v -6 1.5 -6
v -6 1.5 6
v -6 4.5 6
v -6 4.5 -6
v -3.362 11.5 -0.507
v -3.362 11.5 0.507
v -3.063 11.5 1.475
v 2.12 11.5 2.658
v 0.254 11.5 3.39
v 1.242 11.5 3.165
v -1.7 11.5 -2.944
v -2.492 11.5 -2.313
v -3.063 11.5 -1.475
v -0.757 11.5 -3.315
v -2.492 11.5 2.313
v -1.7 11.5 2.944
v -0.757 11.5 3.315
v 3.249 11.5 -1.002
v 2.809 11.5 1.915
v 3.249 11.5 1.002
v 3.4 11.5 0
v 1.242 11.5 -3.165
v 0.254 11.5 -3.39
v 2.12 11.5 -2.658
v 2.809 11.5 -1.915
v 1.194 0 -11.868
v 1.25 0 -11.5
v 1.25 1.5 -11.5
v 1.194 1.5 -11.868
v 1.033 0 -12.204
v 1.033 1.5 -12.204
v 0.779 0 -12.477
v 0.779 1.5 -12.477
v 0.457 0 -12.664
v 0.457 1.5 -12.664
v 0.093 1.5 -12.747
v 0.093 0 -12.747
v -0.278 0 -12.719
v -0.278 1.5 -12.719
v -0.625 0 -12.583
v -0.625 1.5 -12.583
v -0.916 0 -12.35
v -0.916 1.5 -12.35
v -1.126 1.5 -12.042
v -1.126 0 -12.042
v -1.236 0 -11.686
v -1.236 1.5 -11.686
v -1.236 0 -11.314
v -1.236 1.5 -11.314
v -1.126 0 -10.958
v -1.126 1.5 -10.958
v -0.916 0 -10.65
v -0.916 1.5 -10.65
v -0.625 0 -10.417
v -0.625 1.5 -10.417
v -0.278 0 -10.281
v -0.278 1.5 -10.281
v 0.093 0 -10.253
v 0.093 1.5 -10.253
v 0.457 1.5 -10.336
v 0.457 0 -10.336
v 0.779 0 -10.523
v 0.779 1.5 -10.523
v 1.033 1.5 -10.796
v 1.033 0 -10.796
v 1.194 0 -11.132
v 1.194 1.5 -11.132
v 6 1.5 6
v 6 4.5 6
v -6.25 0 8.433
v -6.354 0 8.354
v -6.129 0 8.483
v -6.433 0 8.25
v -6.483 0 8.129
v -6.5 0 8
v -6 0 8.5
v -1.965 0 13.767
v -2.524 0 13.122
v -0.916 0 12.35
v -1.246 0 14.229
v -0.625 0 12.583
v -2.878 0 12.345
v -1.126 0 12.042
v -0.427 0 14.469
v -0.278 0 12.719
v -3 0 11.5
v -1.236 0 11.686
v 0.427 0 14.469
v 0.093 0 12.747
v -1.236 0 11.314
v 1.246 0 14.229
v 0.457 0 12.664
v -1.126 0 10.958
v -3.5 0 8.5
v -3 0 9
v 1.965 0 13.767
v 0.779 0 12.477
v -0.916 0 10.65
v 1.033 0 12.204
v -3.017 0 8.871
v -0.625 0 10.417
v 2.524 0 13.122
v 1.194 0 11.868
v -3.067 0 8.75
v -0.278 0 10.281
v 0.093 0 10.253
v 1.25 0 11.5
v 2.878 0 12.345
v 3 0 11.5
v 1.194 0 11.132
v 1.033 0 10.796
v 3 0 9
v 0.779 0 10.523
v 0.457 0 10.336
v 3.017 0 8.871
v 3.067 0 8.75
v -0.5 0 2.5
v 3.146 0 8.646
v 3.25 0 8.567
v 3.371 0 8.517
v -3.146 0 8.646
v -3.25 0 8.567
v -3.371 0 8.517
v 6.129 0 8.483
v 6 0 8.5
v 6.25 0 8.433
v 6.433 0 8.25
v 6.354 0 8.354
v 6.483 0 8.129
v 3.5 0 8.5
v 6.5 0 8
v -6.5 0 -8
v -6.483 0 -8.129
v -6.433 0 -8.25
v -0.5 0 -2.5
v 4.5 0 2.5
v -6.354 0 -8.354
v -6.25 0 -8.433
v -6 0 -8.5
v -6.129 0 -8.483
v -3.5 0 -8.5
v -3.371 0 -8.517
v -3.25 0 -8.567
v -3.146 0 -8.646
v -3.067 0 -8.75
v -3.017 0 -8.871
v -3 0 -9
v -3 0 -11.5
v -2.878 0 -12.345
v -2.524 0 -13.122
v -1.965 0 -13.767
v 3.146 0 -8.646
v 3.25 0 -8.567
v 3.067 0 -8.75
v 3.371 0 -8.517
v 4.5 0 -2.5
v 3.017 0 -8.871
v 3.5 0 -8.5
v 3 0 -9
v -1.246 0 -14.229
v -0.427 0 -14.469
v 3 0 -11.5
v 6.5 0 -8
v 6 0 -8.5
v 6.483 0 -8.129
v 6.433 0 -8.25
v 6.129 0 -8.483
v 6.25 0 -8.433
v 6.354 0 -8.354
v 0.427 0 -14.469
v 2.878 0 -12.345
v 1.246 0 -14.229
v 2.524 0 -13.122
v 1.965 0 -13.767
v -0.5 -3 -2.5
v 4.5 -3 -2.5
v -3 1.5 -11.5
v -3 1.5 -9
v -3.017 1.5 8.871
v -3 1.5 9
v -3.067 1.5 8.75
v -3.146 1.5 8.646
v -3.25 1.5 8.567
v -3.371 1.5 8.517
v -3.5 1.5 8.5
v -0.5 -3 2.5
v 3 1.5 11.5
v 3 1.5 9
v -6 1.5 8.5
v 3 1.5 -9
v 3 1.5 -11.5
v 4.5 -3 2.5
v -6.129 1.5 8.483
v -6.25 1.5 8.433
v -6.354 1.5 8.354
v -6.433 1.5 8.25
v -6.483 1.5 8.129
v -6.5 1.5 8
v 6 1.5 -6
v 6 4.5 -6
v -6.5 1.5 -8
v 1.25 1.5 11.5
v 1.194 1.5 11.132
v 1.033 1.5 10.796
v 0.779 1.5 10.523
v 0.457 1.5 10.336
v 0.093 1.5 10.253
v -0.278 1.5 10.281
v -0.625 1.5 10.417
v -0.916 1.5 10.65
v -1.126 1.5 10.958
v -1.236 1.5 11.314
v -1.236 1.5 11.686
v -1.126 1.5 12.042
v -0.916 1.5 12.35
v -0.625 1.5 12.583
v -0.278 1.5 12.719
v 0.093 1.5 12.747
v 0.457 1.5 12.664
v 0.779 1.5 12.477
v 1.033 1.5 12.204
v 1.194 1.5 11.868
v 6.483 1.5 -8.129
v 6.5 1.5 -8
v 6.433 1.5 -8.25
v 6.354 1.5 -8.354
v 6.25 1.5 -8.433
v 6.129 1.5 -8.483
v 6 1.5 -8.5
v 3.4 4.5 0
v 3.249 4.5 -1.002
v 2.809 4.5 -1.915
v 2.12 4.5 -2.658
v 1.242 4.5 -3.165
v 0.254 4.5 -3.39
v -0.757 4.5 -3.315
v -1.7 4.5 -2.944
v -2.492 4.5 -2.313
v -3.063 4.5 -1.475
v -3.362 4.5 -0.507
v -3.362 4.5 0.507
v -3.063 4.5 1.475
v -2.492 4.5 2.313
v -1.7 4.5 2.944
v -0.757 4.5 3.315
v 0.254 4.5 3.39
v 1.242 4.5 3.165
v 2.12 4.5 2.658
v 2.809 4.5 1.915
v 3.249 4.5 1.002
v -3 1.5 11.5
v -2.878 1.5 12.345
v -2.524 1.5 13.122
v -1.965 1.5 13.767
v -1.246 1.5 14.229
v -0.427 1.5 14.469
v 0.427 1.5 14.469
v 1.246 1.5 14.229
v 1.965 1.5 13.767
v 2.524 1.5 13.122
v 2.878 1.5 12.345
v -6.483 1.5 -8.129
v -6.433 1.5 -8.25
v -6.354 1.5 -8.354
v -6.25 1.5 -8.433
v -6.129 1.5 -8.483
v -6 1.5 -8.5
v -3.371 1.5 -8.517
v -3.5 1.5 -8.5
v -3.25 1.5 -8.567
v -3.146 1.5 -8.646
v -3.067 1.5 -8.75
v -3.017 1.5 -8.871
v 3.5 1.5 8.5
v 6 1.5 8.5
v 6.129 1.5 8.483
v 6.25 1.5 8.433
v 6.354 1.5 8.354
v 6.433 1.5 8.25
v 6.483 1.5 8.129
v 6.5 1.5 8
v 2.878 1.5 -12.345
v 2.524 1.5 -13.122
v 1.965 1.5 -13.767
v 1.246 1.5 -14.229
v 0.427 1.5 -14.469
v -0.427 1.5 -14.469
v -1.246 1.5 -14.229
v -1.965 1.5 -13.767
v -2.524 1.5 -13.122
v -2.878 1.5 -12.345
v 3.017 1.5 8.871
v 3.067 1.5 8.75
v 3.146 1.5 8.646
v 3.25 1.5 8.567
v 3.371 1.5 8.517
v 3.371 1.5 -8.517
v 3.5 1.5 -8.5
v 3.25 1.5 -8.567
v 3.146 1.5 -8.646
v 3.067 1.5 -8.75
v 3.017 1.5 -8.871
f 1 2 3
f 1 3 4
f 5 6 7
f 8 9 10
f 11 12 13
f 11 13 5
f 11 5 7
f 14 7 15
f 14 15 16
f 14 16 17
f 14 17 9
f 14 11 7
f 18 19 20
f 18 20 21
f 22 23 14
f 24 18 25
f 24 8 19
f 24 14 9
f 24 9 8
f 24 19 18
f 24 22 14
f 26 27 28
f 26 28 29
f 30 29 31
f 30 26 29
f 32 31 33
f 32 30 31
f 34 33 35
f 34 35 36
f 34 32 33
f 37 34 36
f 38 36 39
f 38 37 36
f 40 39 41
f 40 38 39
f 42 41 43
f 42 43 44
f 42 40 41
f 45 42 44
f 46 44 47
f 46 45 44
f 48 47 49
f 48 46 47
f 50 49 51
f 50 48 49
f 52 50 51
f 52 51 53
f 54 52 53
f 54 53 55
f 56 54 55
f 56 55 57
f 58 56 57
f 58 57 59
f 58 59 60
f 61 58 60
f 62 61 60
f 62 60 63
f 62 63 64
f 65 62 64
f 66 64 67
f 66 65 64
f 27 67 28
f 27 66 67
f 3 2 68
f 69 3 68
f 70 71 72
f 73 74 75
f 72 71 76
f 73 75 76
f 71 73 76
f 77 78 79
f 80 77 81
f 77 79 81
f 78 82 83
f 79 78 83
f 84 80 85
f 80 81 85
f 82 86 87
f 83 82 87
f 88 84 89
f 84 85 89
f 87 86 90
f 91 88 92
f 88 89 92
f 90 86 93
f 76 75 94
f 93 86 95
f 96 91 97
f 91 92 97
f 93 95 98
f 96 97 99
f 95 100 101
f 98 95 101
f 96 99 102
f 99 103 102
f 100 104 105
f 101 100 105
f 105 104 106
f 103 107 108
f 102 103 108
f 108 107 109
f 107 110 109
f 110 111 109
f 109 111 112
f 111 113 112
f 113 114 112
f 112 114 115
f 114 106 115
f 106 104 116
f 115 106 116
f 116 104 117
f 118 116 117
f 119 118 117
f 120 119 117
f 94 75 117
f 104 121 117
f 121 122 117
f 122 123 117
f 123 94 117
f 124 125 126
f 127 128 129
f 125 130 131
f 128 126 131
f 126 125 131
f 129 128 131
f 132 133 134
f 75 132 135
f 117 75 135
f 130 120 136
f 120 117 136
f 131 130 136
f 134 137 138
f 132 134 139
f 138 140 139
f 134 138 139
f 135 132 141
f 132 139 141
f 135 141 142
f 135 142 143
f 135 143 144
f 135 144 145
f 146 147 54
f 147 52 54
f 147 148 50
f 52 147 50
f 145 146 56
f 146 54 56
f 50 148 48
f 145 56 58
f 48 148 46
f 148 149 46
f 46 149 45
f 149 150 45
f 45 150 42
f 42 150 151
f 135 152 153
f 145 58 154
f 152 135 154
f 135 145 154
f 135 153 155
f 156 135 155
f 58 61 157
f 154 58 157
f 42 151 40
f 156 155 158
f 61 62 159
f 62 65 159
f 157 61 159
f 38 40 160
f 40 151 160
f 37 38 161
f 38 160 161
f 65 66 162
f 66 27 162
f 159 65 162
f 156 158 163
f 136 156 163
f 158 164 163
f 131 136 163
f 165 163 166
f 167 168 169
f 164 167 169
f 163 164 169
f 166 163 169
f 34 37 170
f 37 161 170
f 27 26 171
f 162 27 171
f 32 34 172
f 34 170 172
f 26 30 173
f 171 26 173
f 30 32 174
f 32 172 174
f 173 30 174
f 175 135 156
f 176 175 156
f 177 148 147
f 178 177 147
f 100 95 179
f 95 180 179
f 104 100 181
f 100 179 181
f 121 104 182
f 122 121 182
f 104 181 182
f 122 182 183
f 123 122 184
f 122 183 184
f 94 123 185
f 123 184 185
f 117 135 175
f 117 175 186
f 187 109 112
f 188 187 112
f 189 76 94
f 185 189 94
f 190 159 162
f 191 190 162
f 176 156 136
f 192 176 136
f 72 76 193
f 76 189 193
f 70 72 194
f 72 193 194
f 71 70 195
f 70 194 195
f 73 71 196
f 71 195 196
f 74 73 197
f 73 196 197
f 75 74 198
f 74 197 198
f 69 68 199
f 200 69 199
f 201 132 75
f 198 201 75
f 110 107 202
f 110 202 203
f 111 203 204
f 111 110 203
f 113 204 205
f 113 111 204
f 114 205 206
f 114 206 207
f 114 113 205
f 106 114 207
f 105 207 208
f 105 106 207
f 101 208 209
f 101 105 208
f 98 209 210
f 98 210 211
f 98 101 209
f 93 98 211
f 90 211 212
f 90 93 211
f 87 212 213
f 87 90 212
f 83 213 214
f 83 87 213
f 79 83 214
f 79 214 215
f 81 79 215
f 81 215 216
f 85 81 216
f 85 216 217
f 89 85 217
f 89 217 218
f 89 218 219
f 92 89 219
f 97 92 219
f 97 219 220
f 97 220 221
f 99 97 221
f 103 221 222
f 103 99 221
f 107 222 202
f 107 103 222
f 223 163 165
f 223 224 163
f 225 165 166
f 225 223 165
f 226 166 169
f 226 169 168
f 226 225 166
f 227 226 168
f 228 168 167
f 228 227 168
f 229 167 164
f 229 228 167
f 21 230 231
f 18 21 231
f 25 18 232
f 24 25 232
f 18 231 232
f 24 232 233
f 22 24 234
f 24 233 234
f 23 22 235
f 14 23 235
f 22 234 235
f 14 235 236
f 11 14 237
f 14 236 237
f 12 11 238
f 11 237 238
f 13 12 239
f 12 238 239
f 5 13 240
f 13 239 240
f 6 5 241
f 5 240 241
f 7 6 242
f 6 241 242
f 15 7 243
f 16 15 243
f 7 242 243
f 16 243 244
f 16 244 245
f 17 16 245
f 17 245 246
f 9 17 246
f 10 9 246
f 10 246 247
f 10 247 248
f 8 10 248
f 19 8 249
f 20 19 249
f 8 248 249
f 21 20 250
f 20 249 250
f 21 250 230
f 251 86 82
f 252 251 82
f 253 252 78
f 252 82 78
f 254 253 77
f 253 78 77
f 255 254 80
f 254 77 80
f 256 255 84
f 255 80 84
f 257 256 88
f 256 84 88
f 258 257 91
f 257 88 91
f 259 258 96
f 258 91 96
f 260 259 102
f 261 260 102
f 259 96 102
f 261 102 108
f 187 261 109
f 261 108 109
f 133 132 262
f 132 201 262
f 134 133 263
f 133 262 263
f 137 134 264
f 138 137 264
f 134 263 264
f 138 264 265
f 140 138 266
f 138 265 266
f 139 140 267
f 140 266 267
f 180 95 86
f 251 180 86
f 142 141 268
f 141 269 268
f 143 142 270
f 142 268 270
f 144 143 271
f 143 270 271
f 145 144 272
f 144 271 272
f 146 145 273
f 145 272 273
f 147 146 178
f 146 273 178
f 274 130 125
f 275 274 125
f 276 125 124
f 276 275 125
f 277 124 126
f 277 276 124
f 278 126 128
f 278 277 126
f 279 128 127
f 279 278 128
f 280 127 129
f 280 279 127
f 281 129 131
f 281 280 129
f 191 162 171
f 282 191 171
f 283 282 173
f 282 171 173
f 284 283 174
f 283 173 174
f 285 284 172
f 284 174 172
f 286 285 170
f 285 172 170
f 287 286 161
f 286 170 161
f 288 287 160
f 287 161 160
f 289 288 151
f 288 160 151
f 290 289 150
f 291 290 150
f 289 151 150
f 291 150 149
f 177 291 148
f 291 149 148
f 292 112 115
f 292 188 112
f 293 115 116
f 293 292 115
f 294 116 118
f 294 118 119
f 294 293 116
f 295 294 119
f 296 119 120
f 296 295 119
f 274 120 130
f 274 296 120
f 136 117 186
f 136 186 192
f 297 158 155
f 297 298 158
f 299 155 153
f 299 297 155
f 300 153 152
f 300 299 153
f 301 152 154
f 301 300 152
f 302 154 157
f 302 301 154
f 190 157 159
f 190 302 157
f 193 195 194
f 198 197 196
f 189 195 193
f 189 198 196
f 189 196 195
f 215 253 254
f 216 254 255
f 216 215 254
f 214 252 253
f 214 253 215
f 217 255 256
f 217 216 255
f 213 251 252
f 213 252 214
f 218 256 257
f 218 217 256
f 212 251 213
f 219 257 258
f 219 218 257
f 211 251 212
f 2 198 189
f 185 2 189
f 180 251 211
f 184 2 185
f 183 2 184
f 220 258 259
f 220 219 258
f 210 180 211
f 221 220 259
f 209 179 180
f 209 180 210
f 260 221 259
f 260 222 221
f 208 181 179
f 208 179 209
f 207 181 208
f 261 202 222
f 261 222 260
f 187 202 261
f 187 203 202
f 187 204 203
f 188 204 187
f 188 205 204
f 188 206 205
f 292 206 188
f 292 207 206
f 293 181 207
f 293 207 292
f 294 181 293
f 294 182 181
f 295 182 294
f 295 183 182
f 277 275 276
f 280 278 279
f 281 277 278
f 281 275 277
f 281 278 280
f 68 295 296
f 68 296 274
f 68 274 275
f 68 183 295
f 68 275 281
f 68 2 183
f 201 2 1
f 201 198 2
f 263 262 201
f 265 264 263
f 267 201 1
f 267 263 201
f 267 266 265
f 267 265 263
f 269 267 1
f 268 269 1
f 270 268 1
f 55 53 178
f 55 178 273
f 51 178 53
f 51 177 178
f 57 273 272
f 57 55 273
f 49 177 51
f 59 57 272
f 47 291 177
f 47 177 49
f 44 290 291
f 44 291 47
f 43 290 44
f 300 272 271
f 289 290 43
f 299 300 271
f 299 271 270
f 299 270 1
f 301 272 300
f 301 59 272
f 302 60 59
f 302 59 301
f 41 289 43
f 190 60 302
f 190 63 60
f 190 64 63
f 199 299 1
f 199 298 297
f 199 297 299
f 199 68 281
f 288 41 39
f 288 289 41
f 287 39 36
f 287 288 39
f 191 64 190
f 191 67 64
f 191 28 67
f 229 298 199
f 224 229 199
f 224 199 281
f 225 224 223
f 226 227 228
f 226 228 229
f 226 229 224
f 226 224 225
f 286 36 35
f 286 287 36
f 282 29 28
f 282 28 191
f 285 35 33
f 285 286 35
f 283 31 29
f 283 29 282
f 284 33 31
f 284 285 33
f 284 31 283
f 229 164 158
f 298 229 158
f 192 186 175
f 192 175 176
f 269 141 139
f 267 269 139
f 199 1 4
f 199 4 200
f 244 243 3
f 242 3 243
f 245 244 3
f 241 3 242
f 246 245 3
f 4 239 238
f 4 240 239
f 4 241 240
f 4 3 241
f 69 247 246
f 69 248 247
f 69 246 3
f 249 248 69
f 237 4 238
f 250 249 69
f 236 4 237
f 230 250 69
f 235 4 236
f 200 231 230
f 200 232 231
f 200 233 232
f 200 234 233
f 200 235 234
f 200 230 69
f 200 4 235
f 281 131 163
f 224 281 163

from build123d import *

# Parameters (mm, degrees)
SKETCH_1_R      = 1.25
PCB_DEPTH       = 1.5
SKETCH_6_W      = 5
SKETCH_6_H      = 5
EXTRUDE_2_DEPTH = 3
SKETCH_3_W      = 12
SKETCH_3_H      = 12
BUTTON_DEPTH    = 3
SKETCH_7_R      = 3.4
EXTRUDE_3_DEPTH = 7
FILLET_1_R      = 0.5


with BuildPart() as part:
    # 草图1 → 凸台-拉伸-PCB板 (new body)
    with BuildSketch(Plane(origin=(0, 0, 0), x_dir=(1, 0, 0), z_dir=(0, 1, 0))):
        with BuildLine():
            Line((-3, -8.5), (-3, -11.5))
            ThreePointArc((-3, -11.5), (0, -14.5), (3, -11.5))
            Line((3, -11.5), (3, -8.5))
            Line((3, -8.5), (6.5, -8.5))
            Line((6.5, -8.5), (6.5, 8.5))
            Line((6.5, 8.5), (3, 8.5))
            Line((3, 8.5), (3, 11.5))
            ThreePointArc((3, 11.5), (0, 14.5), (-3, 11.5))
            Line((-3, 11.5), (-3, 8.5))
            Line((-3, 8.5), (-6.5, 8.5))
            Line((-6.5, 8.5), (-6.5, -8.5))
            Line((-6.5, -8.5), (-3, -8.5))
        make_face()
        with Locations((0, -11.5)):
            Circle(SKETCH_1_R, mode=Mode.SUBTRACT)
        with Locations((0, 11.5)):
            Circle(SKETCH_1_R, mode=Mode.SUBTRACT)
    extrude(amount=PCB_DEPTH)

    # 草图6 → 凸台-拉伸2 (add)
    with BuildSketch(Plane.XZ):
        with Locations((2, 0)):
            Rectangle(SKETCH_6_W, SKETCH_6_H)
    extrude(amount=EXTRUDE_2_DEPTH)

    # 草图3 → 凸台-拉伸-Button-底座 (add)
    with BuildSketch(Plane(origin=(0, 1.5, 0), x_dir=(1, 0, 0), z_dir=(0, 1, 0))):
        Rectangle(SKETCH_3_W, SKETCH_3_H)
    extrude(amount=BUTTON_DEPTH)

    # 草图7 → 凸台-拉伸3 (add)
    with BuildSketch(Plane(origin=(0, 4.5, 0), x_dir=(1, 0, 0), z_dir=(0, 1, 0))):
        Circle(SKETCH_7_R)
    extrude(amount=EXTRUDE_3_DEPTH)

    # 圆角1
    fillet_1_edges = [part.edges().sort_by_distance(p)[0] for p in [
        (-3, 0.75, 8.5),
        (-6.5, 0.75, 8.5),
        (-6.5, 0.75, -8.5),
        (-3, 0.75, -8.5),
        (3, 0.75, -8.5),
        (6.5, 0.75, -8.5),
        (6.5, 0.75, 8.5),
        (3, 0.75, 8.5),
    ]]
    fillet(fillet_1_edges, radius=FILLET_1_R)


solid = part.part
